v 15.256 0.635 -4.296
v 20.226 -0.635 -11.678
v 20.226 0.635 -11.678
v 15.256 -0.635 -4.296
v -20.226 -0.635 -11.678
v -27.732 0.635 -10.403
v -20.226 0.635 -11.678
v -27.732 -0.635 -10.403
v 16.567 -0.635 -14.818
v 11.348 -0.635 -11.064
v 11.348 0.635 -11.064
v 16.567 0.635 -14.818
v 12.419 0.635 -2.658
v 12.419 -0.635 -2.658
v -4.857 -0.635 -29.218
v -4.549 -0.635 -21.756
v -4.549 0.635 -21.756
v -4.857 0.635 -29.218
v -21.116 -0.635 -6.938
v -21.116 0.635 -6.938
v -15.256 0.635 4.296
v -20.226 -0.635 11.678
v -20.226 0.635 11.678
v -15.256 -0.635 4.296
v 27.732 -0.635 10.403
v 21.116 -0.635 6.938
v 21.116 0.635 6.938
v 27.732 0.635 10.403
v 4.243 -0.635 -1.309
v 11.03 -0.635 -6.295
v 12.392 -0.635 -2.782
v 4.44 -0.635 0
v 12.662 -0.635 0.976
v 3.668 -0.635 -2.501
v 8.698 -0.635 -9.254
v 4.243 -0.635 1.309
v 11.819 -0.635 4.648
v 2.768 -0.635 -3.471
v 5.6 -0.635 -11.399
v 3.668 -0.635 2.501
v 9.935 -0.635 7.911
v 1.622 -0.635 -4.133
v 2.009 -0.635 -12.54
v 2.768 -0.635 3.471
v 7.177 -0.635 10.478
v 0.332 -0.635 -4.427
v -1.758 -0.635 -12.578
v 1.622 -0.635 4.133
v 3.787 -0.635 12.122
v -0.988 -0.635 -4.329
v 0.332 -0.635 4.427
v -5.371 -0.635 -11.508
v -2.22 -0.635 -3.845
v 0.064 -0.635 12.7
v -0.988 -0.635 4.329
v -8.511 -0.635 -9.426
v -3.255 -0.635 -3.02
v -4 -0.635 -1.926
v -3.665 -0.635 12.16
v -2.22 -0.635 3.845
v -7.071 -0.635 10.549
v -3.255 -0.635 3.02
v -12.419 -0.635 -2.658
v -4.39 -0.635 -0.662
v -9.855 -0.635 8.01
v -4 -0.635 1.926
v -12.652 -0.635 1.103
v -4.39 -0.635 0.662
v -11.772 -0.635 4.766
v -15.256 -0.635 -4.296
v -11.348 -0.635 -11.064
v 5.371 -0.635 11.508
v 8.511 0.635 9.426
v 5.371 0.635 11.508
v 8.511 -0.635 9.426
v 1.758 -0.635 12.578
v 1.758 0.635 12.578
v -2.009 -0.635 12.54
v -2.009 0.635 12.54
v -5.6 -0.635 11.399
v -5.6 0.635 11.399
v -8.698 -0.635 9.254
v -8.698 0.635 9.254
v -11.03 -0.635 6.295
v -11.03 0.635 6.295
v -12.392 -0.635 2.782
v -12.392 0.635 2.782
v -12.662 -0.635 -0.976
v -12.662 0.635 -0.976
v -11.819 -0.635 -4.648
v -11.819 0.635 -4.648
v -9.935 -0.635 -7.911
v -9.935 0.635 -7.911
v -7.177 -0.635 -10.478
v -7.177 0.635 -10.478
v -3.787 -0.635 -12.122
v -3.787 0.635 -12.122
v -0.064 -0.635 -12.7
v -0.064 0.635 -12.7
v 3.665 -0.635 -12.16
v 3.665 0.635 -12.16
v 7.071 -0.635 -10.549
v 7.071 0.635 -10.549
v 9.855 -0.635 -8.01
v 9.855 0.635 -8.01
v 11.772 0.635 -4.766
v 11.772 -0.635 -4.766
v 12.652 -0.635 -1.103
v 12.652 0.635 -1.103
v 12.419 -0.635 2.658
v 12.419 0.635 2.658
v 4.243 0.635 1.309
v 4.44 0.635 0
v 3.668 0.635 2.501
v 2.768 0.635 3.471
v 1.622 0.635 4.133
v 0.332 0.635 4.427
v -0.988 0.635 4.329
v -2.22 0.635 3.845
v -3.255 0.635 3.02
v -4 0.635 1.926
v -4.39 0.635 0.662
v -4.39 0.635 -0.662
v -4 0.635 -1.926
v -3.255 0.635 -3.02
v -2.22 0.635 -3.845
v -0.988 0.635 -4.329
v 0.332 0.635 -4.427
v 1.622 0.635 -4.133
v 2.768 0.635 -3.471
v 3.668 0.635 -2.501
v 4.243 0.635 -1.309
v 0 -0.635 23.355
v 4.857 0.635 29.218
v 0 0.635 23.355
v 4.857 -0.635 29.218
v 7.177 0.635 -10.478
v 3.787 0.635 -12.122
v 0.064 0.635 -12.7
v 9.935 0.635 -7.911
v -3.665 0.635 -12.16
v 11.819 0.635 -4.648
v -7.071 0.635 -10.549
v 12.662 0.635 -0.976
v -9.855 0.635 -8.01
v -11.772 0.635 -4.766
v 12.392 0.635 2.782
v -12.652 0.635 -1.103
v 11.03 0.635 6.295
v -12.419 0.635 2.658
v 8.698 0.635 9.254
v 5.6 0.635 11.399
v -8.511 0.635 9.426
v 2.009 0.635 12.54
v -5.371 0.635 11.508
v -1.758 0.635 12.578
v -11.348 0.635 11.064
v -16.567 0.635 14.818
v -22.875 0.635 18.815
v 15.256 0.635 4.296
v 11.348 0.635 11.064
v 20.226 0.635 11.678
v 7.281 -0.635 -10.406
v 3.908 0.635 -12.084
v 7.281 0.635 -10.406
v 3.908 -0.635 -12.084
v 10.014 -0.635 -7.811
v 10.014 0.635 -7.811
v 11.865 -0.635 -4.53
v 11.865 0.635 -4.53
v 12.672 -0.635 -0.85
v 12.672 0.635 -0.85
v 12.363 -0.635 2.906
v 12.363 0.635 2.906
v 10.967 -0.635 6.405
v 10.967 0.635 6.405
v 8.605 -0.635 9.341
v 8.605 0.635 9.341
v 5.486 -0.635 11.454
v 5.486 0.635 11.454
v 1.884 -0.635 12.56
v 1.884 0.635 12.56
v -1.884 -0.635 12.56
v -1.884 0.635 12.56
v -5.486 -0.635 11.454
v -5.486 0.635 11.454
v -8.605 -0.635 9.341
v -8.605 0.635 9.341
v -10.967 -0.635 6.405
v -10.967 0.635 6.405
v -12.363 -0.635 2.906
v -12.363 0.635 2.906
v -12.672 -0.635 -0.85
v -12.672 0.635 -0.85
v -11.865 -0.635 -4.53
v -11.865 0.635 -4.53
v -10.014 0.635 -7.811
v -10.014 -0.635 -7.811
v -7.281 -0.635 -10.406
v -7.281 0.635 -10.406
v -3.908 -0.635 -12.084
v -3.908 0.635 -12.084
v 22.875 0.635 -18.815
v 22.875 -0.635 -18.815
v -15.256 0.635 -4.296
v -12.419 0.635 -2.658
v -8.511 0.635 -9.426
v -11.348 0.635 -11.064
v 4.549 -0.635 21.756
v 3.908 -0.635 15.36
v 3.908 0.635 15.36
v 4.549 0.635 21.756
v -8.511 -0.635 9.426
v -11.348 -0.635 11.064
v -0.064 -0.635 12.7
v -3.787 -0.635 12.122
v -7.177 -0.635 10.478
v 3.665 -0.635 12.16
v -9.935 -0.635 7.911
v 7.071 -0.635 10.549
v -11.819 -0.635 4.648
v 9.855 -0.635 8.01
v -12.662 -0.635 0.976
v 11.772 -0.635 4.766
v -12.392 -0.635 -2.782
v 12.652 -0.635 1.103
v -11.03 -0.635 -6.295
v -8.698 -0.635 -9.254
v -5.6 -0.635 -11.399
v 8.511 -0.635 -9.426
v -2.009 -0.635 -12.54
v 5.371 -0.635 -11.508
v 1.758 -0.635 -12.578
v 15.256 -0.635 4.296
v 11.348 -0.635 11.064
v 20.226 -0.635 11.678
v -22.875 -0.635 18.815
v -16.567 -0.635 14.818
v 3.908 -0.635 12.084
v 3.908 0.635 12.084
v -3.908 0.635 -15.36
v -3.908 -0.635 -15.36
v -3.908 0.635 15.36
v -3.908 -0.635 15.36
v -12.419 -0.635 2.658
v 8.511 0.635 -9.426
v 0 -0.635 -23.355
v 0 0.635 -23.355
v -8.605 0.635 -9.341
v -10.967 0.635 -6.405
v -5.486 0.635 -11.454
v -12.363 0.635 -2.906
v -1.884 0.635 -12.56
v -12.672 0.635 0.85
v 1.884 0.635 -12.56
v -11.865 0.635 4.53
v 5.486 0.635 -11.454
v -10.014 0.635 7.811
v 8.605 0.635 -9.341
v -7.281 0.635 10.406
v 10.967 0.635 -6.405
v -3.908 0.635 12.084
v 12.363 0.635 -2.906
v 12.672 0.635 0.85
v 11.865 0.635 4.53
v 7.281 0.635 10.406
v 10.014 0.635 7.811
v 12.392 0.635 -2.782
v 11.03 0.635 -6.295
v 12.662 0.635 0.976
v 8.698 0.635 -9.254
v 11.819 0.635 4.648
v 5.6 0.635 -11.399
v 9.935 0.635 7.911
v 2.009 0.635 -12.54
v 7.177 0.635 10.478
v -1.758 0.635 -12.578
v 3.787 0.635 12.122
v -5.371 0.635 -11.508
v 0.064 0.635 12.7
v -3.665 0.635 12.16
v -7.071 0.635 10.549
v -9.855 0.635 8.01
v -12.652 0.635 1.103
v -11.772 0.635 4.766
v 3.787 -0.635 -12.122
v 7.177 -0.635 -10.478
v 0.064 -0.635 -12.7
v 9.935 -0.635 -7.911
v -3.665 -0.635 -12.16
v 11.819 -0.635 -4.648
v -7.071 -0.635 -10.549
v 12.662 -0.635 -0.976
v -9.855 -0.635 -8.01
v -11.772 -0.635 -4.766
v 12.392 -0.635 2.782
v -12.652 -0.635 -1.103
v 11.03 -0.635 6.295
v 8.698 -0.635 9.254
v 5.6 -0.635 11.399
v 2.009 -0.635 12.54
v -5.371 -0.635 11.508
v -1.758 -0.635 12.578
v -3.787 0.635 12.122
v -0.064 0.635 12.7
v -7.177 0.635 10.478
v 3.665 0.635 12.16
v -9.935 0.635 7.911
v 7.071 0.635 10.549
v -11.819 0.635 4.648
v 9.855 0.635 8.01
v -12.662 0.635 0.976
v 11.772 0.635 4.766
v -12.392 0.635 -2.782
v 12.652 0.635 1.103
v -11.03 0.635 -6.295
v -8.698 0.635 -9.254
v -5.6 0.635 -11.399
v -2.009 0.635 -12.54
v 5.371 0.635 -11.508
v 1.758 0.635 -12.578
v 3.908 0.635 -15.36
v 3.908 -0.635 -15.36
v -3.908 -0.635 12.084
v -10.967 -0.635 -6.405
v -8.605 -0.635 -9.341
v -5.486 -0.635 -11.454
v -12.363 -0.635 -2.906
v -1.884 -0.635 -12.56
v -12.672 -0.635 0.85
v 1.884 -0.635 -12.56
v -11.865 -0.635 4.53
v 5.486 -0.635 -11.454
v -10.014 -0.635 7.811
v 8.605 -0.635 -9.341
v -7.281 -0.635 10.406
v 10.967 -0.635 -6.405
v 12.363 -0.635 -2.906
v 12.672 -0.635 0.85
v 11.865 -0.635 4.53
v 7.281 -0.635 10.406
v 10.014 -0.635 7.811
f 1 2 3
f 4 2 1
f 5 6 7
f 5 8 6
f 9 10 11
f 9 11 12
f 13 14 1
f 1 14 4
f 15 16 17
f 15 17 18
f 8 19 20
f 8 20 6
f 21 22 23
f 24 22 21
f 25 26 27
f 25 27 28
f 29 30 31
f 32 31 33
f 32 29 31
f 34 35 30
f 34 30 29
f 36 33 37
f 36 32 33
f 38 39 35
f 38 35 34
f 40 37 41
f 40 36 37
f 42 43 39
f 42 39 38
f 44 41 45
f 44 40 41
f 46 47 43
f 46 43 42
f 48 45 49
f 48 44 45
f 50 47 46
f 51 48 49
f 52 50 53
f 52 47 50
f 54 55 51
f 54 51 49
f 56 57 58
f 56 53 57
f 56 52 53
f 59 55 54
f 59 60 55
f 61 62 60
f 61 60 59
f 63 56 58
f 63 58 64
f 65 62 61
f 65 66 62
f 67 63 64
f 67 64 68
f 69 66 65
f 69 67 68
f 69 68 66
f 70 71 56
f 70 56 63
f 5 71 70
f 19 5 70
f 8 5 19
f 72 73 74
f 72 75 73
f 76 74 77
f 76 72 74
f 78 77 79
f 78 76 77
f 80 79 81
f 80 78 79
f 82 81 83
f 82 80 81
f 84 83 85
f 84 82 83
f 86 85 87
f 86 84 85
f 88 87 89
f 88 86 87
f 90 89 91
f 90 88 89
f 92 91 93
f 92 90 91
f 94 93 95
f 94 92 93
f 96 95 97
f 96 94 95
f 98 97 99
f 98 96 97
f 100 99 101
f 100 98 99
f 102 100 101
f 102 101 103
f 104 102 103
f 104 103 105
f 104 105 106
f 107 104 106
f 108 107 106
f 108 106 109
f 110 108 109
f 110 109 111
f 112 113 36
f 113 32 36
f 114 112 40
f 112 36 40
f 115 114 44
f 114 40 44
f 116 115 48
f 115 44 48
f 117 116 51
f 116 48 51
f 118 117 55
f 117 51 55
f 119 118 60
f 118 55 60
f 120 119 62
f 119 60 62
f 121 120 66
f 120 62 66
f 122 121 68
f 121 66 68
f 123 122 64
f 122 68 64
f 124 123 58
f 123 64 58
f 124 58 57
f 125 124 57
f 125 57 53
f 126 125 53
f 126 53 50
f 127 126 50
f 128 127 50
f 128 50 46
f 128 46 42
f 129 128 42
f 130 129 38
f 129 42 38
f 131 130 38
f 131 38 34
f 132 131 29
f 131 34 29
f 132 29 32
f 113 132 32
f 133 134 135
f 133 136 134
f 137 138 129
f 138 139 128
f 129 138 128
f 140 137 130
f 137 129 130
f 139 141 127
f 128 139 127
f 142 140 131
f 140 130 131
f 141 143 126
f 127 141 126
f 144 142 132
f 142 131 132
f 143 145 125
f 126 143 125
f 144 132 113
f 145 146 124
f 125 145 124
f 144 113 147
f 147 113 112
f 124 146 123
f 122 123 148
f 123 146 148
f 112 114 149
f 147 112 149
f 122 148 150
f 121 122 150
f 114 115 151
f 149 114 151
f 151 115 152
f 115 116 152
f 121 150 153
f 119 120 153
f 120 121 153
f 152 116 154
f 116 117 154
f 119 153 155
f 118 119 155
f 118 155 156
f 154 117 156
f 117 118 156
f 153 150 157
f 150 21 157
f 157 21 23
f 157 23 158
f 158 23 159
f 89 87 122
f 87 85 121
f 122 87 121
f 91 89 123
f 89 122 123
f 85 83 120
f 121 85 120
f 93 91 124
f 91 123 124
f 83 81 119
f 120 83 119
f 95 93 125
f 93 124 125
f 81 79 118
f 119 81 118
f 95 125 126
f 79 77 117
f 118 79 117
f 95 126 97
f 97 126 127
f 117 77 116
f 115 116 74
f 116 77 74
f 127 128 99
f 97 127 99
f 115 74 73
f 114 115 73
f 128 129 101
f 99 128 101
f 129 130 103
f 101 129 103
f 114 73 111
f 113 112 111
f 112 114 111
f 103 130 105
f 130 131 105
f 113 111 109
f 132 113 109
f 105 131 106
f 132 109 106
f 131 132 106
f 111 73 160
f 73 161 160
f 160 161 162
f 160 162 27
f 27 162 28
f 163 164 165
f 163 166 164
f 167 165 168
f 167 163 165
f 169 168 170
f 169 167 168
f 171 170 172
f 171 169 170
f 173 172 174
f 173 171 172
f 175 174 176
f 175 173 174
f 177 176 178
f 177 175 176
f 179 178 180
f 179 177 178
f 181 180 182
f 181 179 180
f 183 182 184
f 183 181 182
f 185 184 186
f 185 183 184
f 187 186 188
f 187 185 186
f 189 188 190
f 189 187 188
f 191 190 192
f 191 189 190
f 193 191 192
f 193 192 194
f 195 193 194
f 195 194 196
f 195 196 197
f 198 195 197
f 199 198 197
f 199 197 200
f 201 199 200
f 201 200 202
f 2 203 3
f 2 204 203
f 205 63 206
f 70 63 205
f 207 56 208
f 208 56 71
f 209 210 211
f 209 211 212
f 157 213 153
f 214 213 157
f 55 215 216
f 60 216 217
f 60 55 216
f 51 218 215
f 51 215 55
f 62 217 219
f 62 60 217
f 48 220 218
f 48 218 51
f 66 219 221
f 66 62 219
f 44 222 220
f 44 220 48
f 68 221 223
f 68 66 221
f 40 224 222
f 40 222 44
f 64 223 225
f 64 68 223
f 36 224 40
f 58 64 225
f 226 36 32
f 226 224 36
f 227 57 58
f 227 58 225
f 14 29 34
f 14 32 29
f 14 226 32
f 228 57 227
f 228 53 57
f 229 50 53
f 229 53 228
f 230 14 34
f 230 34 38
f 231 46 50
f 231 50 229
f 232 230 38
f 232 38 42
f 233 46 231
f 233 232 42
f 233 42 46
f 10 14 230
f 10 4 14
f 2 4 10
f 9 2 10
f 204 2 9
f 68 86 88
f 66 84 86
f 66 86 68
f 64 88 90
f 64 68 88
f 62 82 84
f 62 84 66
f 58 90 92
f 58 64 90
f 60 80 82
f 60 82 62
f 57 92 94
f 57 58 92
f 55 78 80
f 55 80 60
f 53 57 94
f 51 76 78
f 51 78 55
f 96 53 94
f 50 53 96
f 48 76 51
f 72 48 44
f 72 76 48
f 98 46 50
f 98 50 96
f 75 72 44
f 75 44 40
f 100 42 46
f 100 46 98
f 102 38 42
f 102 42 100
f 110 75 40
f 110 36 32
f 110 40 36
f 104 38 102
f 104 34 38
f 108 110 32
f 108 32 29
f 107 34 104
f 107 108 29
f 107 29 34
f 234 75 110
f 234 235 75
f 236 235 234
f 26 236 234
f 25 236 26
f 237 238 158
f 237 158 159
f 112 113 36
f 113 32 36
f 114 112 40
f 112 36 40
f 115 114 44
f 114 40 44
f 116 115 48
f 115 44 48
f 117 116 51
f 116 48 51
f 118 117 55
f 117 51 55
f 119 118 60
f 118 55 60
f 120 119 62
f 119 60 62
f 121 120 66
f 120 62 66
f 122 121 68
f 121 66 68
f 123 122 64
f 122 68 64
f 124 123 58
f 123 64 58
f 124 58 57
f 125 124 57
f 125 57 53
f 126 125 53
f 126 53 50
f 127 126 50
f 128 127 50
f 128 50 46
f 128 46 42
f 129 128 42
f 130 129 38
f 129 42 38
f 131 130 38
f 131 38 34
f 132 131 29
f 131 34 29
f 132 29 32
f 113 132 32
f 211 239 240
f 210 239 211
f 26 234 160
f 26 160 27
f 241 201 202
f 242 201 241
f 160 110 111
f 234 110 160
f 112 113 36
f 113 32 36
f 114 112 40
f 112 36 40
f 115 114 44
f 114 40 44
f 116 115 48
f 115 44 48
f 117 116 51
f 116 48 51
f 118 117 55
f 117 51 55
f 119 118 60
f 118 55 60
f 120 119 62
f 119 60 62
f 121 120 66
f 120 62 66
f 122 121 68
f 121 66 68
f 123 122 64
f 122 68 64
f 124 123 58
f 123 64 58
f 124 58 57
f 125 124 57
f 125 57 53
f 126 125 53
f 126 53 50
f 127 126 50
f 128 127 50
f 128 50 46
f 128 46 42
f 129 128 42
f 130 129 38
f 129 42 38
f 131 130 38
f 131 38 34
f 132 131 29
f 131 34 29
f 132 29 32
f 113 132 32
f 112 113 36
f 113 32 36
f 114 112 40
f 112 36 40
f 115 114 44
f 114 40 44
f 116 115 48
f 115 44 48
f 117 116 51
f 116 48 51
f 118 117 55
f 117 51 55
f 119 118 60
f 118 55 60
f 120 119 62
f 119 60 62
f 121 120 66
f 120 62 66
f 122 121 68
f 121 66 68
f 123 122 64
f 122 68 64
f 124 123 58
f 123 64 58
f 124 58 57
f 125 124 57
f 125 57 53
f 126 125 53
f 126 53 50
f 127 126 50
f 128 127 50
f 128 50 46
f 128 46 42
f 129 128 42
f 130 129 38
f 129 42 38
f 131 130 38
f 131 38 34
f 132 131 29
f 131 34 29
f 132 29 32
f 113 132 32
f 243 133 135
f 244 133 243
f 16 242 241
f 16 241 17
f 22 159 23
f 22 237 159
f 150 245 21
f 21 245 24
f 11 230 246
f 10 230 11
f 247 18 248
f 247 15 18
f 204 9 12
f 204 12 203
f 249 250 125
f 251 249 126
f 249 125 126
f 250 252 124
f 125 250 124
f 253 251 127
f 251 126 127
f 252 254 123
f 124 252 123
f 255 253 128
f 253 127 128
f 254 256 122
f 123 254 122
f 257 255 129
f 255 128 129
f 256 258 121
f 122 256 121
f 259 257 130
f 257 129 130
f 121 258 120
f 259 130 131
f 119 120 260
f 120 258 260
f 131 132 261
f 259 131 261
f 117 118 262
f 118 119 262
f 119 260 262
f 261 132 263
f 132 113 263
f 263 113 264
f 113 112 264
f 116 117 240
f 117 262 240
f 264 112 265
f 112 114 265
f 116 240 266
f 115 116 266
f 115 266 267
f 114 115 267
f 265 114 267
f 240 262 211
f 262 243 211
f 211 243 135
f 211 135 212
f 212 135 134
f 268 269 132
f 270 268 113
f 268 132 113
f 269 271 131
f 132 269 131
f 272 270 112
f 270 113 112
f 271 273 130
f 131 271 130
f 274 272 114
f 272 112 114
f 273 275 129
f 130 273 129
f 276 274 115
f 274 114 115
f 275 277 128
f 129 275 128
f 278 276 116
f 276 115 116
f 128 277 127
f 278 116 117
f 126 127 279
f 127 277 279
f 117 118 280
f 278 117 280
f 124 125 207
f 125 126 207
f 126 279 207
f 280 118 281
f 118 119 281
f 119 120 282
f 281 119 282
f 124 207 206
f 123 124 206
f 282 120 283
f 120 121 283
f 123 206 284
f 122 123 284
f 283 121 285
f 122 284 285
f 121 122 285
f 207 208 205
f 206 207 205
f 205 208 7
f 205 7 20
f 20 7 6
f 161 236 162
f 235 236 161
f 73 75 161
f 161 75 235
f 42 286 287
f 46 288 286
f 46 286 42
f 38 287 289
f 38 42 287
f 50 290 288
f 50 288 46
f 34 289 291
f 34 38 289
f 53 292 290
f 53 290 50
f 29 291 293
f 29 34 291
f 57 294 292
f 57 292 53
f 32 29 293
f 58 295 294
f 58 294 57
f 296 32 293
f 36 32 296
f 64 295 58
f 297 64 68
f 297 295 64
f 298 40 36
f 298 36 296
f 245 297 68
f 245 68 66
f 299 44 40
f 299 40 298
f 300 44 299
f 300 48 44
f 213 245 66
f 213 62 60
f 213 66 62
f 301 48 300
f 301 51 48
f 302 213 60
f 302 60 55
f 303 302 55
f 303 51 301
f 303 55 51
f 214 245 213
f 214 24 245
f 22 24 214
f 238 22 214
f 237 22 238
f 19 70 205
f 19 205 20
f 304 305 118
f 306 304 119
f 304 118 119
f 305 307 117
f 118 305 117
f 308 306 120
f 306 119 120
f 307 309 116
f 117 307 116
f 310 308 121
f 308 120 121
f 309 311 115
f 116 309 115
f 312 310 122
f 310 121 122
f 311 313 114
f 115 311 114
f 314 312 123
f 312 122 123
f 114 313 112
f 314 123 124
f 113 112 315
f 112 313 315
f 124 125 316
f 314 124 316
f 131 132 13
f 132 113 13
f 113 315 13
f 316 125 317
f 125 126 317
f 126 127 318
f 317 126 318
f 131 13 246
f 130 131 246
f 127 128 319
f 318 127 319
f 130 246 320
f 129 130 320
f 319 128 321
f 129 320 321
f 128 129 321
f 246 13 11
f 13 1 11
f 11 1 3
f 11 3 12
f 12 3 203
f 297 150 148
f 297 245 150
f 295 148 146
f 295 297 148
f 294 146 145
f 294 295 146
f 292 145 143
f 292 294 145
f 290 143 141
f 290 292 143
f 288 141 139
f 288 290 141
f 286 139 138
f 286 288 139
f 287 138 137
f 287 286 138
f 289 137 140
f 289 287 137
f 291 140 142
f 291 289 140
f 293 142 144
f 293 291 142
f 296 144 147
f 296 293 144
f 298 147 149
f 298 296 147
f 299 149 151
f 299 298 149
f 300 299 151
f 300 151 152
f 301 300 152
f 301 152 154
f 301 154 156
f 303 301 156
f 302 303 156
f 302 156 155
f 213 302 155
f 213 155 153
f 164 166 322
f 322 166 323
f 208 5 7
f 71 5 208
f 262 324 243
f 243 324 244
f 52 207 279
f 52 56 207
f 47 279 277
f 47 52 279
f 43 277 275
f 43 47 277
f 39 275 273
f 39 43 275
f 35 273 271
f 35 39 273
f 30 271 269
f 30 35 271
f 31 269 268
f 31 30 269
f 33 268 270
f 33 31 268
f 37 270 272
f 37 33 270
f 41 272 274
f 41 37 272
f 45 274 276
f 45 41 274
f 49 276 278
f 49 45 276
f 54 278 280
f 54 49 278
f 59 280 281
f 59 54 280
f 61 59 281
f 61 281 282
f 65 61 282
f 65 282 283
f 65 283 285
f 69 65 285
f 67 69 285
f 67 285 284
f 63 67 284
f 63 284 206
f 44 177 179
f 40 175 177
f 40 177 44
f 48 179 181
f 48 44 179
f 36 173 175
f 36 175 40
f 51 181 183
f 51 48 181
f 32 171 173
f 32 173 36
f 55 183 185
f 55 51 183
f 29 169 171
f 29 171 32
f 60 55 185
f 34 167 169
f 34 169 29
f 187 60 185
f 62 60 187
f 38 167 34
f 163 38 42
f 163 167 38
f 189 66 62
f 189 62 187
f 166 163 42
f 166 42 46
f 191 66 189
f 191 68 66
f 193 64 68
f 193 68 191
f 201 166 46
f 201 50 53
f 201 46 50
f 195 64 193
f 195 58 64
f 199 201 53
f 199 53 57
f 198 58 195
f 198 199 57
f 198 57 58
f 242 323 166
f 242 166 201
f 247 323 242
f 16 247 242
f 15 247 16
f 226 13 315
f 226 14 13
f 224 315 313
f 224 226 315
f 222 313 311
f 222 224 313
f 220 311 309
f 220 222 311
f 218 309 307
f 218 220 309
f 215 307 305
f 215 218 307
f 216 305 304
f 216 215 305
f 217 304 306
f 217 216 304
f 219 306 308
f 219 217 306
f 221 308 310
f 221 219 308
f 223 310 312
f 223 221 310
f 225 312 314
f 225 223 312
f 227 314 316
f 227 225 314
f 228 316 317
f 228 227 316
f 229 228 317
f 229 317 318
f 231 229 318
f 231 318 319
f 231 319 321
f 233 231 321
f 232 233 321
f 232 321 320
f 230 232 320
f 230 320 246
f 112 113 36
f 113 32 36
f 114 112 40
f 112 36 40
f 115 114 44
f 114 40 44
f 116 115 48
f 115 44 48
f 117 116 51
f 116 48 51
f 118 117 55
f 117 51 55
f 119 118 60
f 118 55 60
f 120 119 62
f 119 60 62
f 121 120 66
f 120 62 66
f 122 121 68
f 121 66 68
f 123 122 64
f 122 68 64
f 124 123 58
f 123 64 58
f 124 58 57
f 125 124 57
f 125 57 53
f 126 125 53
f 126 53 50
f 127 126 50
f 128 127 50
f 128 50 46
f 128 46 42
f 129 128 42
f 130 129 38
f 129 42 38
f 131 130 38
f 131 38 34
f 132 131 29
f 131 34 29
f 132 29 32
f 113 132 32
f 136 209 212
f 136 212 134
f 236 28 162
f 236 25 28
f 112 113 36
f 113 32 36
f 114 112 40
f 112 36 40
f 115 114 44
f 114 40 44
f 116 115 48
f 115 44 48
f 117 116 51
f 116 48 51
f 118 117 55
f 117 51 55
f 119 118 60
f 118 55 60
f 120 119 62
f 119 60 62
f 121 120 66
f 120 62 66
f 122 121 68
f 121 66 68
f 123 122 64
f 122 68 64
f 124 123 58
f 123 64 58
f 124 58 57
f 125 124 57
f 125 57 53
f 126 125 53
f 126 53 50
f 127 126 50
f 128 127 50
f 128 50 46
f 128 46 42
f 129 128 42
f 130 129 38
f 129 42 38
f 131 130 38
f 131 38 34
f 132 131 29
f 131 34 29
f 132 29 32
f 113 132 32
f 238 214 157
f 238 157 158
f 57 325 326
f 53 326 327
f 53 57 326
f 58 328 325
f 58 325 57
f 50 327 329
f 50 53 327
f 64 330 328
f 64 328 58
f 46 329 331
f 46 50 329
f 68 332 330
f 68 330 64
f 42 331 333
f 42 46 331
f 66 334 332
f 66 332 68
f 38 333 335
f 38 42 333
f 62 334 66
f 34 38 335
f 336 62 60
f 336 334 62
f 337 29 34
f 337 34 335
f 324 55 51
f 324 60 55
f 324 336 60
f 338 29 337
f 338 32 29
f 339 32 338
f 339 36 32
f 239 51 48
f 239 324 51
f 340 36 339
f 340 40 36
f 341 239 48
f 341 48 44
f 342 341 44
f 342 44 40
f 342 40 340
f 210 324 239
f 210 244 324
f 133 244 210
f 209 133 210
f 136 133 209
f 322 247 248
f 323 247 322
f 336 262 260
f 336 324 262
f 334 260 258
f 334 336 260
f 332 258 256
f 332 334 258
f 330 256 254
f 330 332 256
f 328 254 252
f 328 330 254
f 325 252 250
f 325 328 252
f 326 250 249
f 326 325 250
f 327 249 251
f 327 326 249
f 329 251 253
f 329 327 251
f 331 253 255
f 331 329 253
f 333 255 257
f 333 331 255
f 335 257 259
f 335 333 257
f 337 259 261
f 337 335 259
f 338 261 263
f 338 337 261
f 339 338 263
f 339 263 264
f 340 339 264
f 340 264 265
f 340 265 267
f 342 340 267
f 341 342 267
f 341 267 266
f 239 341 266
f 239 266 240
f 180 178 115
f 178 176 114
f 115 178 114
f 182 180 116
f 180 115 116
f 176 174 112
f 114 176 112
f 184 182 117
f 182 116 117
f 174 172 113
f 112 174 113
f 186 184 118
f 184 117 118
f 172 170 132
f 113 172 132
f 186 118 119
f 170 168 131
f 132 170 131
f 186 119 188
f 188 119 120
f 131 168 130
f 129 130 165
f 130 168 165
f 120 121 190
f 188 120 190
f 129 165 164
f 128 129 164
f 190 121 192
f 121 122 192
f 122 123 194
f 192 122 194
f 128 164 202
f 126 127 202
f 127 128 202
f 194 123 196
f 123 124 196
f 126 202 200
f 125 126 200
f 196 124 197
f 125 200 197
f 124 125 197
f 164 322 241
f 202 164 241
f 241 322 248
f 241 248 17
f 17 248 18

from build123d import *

# Parameters (mm, degrees)
F0_R     = 12.7
F1_DEPTH = 0.635
F2_W     = 7.8154923394
F2_H     = 5.9610567987
F3_DEPTH = 0.635
F4_COUNT = 6
F5_R     = 4.439905228
F6_DEPTH = 0.635


with BuildPart() as f1:
    # F0 (on Front) → F1 (new body, symmetric)
    with BuildSketch(Plane.XZ):
        Circle(F0_R)
    extrude(amount=F1_DEPTH, both=True)

    # F2 (on Front) → F3 (join, symmetric)
    with BuildSketch(Plane.XZ):
        with Locations((0, 12.3791769147)):
            Rectangle(F2_W, F2_H)
        Polygon((-3.9077461697, 15.359705314), (3.9077461697, 15.359705314), (4.5490232296, 21.7559374869), (0, 23.3552493155), align=None)
        Polygon((0, 23.3552493155), (4.5490232296, 21.7559374869), (4.8568574712, 29.218012467), align=None)
    extrude(amount=F3_DEPTH, both=True)


with BuildPart() as f4_1:
    # F4: instance of F1
    add(f1.part.rotate(Axis((0, 0, 0), (0, -1, 0)), 1 * 360 / F4_COUNT))


with BuildPart() as f4_2:
    # F4: instance of F1
    add(f1.part.rotate(Axis((0, 0, 0), (0, -1, 0)), 2 * 360 / F4_COUNT))


with BuildPart() as f4_3:
    # F4: instance of F1
    add(f1.part.rotate(Axis((0, 0, 0), (0, -1, 0)), 3 * 360 / F4_COUNT))


with BuildPart() as f4_4:
    # F4: instance of F1
    add(f1.part.rotate(Axis((0, 0, 0), (0, -1, 0)), 4 * 360 / F4_COUNT))


with BuildPart() as f4_5:
    # F4: instance of F1
    add(f1.part.rotate(Axis((0, 0, 0), (0, -1, 0)), 5 * 360 / F4_COUNT))


with BuildPart() as f6_tool:
    # F5 (on Front) → F6 (new body, symmetric)
    with BuildSketch(Plane.XZ):
        Circle(F5_R)
    extrude(amount=F6_DEPTH, both=True)


with BuildPart() as f1_1:
    add(f1.part)

    # F6: cut by f6_tool
    add(f6_tool.part, mode=Mode.SUBTRACT)


with BuildPart() as f4_1_1:
    add(f4_1.part)

    # F6: cut by f6_tool
    add(f6_tool.part, mode=Mode.SUBTRACT)


with BuildPart() as f4_2_1:
    add(f4_2.part)

    # F6: cut by f6_tool
    add(f6_tool.part, mode=Mode.SUBTRACT)


with BuildPart() as f4_3_1:
    add(f4_3.part)

    # F6: cut by f6_tool
    add(f6_tool.part, mode=Mode.SUBTRACT)


with BuildPart() as f4_4_1:
    add(f4_4.part)

    # F6: cut by f6_tool
    add(f6_tool.part, mode=Mode.SUBTRACT)


with BuildPart() as f4_5_1:
    add(f4_5.part)

    # F6: cut by f6_tool
    add(f6_tool.part, mode=Mode.SUBTRACT)


solid = Compound([f1_1.part, f4_1_1.part, f4_2_1.part, f4_3_1.part, f4_4_1.part, f4_5_1.part])
